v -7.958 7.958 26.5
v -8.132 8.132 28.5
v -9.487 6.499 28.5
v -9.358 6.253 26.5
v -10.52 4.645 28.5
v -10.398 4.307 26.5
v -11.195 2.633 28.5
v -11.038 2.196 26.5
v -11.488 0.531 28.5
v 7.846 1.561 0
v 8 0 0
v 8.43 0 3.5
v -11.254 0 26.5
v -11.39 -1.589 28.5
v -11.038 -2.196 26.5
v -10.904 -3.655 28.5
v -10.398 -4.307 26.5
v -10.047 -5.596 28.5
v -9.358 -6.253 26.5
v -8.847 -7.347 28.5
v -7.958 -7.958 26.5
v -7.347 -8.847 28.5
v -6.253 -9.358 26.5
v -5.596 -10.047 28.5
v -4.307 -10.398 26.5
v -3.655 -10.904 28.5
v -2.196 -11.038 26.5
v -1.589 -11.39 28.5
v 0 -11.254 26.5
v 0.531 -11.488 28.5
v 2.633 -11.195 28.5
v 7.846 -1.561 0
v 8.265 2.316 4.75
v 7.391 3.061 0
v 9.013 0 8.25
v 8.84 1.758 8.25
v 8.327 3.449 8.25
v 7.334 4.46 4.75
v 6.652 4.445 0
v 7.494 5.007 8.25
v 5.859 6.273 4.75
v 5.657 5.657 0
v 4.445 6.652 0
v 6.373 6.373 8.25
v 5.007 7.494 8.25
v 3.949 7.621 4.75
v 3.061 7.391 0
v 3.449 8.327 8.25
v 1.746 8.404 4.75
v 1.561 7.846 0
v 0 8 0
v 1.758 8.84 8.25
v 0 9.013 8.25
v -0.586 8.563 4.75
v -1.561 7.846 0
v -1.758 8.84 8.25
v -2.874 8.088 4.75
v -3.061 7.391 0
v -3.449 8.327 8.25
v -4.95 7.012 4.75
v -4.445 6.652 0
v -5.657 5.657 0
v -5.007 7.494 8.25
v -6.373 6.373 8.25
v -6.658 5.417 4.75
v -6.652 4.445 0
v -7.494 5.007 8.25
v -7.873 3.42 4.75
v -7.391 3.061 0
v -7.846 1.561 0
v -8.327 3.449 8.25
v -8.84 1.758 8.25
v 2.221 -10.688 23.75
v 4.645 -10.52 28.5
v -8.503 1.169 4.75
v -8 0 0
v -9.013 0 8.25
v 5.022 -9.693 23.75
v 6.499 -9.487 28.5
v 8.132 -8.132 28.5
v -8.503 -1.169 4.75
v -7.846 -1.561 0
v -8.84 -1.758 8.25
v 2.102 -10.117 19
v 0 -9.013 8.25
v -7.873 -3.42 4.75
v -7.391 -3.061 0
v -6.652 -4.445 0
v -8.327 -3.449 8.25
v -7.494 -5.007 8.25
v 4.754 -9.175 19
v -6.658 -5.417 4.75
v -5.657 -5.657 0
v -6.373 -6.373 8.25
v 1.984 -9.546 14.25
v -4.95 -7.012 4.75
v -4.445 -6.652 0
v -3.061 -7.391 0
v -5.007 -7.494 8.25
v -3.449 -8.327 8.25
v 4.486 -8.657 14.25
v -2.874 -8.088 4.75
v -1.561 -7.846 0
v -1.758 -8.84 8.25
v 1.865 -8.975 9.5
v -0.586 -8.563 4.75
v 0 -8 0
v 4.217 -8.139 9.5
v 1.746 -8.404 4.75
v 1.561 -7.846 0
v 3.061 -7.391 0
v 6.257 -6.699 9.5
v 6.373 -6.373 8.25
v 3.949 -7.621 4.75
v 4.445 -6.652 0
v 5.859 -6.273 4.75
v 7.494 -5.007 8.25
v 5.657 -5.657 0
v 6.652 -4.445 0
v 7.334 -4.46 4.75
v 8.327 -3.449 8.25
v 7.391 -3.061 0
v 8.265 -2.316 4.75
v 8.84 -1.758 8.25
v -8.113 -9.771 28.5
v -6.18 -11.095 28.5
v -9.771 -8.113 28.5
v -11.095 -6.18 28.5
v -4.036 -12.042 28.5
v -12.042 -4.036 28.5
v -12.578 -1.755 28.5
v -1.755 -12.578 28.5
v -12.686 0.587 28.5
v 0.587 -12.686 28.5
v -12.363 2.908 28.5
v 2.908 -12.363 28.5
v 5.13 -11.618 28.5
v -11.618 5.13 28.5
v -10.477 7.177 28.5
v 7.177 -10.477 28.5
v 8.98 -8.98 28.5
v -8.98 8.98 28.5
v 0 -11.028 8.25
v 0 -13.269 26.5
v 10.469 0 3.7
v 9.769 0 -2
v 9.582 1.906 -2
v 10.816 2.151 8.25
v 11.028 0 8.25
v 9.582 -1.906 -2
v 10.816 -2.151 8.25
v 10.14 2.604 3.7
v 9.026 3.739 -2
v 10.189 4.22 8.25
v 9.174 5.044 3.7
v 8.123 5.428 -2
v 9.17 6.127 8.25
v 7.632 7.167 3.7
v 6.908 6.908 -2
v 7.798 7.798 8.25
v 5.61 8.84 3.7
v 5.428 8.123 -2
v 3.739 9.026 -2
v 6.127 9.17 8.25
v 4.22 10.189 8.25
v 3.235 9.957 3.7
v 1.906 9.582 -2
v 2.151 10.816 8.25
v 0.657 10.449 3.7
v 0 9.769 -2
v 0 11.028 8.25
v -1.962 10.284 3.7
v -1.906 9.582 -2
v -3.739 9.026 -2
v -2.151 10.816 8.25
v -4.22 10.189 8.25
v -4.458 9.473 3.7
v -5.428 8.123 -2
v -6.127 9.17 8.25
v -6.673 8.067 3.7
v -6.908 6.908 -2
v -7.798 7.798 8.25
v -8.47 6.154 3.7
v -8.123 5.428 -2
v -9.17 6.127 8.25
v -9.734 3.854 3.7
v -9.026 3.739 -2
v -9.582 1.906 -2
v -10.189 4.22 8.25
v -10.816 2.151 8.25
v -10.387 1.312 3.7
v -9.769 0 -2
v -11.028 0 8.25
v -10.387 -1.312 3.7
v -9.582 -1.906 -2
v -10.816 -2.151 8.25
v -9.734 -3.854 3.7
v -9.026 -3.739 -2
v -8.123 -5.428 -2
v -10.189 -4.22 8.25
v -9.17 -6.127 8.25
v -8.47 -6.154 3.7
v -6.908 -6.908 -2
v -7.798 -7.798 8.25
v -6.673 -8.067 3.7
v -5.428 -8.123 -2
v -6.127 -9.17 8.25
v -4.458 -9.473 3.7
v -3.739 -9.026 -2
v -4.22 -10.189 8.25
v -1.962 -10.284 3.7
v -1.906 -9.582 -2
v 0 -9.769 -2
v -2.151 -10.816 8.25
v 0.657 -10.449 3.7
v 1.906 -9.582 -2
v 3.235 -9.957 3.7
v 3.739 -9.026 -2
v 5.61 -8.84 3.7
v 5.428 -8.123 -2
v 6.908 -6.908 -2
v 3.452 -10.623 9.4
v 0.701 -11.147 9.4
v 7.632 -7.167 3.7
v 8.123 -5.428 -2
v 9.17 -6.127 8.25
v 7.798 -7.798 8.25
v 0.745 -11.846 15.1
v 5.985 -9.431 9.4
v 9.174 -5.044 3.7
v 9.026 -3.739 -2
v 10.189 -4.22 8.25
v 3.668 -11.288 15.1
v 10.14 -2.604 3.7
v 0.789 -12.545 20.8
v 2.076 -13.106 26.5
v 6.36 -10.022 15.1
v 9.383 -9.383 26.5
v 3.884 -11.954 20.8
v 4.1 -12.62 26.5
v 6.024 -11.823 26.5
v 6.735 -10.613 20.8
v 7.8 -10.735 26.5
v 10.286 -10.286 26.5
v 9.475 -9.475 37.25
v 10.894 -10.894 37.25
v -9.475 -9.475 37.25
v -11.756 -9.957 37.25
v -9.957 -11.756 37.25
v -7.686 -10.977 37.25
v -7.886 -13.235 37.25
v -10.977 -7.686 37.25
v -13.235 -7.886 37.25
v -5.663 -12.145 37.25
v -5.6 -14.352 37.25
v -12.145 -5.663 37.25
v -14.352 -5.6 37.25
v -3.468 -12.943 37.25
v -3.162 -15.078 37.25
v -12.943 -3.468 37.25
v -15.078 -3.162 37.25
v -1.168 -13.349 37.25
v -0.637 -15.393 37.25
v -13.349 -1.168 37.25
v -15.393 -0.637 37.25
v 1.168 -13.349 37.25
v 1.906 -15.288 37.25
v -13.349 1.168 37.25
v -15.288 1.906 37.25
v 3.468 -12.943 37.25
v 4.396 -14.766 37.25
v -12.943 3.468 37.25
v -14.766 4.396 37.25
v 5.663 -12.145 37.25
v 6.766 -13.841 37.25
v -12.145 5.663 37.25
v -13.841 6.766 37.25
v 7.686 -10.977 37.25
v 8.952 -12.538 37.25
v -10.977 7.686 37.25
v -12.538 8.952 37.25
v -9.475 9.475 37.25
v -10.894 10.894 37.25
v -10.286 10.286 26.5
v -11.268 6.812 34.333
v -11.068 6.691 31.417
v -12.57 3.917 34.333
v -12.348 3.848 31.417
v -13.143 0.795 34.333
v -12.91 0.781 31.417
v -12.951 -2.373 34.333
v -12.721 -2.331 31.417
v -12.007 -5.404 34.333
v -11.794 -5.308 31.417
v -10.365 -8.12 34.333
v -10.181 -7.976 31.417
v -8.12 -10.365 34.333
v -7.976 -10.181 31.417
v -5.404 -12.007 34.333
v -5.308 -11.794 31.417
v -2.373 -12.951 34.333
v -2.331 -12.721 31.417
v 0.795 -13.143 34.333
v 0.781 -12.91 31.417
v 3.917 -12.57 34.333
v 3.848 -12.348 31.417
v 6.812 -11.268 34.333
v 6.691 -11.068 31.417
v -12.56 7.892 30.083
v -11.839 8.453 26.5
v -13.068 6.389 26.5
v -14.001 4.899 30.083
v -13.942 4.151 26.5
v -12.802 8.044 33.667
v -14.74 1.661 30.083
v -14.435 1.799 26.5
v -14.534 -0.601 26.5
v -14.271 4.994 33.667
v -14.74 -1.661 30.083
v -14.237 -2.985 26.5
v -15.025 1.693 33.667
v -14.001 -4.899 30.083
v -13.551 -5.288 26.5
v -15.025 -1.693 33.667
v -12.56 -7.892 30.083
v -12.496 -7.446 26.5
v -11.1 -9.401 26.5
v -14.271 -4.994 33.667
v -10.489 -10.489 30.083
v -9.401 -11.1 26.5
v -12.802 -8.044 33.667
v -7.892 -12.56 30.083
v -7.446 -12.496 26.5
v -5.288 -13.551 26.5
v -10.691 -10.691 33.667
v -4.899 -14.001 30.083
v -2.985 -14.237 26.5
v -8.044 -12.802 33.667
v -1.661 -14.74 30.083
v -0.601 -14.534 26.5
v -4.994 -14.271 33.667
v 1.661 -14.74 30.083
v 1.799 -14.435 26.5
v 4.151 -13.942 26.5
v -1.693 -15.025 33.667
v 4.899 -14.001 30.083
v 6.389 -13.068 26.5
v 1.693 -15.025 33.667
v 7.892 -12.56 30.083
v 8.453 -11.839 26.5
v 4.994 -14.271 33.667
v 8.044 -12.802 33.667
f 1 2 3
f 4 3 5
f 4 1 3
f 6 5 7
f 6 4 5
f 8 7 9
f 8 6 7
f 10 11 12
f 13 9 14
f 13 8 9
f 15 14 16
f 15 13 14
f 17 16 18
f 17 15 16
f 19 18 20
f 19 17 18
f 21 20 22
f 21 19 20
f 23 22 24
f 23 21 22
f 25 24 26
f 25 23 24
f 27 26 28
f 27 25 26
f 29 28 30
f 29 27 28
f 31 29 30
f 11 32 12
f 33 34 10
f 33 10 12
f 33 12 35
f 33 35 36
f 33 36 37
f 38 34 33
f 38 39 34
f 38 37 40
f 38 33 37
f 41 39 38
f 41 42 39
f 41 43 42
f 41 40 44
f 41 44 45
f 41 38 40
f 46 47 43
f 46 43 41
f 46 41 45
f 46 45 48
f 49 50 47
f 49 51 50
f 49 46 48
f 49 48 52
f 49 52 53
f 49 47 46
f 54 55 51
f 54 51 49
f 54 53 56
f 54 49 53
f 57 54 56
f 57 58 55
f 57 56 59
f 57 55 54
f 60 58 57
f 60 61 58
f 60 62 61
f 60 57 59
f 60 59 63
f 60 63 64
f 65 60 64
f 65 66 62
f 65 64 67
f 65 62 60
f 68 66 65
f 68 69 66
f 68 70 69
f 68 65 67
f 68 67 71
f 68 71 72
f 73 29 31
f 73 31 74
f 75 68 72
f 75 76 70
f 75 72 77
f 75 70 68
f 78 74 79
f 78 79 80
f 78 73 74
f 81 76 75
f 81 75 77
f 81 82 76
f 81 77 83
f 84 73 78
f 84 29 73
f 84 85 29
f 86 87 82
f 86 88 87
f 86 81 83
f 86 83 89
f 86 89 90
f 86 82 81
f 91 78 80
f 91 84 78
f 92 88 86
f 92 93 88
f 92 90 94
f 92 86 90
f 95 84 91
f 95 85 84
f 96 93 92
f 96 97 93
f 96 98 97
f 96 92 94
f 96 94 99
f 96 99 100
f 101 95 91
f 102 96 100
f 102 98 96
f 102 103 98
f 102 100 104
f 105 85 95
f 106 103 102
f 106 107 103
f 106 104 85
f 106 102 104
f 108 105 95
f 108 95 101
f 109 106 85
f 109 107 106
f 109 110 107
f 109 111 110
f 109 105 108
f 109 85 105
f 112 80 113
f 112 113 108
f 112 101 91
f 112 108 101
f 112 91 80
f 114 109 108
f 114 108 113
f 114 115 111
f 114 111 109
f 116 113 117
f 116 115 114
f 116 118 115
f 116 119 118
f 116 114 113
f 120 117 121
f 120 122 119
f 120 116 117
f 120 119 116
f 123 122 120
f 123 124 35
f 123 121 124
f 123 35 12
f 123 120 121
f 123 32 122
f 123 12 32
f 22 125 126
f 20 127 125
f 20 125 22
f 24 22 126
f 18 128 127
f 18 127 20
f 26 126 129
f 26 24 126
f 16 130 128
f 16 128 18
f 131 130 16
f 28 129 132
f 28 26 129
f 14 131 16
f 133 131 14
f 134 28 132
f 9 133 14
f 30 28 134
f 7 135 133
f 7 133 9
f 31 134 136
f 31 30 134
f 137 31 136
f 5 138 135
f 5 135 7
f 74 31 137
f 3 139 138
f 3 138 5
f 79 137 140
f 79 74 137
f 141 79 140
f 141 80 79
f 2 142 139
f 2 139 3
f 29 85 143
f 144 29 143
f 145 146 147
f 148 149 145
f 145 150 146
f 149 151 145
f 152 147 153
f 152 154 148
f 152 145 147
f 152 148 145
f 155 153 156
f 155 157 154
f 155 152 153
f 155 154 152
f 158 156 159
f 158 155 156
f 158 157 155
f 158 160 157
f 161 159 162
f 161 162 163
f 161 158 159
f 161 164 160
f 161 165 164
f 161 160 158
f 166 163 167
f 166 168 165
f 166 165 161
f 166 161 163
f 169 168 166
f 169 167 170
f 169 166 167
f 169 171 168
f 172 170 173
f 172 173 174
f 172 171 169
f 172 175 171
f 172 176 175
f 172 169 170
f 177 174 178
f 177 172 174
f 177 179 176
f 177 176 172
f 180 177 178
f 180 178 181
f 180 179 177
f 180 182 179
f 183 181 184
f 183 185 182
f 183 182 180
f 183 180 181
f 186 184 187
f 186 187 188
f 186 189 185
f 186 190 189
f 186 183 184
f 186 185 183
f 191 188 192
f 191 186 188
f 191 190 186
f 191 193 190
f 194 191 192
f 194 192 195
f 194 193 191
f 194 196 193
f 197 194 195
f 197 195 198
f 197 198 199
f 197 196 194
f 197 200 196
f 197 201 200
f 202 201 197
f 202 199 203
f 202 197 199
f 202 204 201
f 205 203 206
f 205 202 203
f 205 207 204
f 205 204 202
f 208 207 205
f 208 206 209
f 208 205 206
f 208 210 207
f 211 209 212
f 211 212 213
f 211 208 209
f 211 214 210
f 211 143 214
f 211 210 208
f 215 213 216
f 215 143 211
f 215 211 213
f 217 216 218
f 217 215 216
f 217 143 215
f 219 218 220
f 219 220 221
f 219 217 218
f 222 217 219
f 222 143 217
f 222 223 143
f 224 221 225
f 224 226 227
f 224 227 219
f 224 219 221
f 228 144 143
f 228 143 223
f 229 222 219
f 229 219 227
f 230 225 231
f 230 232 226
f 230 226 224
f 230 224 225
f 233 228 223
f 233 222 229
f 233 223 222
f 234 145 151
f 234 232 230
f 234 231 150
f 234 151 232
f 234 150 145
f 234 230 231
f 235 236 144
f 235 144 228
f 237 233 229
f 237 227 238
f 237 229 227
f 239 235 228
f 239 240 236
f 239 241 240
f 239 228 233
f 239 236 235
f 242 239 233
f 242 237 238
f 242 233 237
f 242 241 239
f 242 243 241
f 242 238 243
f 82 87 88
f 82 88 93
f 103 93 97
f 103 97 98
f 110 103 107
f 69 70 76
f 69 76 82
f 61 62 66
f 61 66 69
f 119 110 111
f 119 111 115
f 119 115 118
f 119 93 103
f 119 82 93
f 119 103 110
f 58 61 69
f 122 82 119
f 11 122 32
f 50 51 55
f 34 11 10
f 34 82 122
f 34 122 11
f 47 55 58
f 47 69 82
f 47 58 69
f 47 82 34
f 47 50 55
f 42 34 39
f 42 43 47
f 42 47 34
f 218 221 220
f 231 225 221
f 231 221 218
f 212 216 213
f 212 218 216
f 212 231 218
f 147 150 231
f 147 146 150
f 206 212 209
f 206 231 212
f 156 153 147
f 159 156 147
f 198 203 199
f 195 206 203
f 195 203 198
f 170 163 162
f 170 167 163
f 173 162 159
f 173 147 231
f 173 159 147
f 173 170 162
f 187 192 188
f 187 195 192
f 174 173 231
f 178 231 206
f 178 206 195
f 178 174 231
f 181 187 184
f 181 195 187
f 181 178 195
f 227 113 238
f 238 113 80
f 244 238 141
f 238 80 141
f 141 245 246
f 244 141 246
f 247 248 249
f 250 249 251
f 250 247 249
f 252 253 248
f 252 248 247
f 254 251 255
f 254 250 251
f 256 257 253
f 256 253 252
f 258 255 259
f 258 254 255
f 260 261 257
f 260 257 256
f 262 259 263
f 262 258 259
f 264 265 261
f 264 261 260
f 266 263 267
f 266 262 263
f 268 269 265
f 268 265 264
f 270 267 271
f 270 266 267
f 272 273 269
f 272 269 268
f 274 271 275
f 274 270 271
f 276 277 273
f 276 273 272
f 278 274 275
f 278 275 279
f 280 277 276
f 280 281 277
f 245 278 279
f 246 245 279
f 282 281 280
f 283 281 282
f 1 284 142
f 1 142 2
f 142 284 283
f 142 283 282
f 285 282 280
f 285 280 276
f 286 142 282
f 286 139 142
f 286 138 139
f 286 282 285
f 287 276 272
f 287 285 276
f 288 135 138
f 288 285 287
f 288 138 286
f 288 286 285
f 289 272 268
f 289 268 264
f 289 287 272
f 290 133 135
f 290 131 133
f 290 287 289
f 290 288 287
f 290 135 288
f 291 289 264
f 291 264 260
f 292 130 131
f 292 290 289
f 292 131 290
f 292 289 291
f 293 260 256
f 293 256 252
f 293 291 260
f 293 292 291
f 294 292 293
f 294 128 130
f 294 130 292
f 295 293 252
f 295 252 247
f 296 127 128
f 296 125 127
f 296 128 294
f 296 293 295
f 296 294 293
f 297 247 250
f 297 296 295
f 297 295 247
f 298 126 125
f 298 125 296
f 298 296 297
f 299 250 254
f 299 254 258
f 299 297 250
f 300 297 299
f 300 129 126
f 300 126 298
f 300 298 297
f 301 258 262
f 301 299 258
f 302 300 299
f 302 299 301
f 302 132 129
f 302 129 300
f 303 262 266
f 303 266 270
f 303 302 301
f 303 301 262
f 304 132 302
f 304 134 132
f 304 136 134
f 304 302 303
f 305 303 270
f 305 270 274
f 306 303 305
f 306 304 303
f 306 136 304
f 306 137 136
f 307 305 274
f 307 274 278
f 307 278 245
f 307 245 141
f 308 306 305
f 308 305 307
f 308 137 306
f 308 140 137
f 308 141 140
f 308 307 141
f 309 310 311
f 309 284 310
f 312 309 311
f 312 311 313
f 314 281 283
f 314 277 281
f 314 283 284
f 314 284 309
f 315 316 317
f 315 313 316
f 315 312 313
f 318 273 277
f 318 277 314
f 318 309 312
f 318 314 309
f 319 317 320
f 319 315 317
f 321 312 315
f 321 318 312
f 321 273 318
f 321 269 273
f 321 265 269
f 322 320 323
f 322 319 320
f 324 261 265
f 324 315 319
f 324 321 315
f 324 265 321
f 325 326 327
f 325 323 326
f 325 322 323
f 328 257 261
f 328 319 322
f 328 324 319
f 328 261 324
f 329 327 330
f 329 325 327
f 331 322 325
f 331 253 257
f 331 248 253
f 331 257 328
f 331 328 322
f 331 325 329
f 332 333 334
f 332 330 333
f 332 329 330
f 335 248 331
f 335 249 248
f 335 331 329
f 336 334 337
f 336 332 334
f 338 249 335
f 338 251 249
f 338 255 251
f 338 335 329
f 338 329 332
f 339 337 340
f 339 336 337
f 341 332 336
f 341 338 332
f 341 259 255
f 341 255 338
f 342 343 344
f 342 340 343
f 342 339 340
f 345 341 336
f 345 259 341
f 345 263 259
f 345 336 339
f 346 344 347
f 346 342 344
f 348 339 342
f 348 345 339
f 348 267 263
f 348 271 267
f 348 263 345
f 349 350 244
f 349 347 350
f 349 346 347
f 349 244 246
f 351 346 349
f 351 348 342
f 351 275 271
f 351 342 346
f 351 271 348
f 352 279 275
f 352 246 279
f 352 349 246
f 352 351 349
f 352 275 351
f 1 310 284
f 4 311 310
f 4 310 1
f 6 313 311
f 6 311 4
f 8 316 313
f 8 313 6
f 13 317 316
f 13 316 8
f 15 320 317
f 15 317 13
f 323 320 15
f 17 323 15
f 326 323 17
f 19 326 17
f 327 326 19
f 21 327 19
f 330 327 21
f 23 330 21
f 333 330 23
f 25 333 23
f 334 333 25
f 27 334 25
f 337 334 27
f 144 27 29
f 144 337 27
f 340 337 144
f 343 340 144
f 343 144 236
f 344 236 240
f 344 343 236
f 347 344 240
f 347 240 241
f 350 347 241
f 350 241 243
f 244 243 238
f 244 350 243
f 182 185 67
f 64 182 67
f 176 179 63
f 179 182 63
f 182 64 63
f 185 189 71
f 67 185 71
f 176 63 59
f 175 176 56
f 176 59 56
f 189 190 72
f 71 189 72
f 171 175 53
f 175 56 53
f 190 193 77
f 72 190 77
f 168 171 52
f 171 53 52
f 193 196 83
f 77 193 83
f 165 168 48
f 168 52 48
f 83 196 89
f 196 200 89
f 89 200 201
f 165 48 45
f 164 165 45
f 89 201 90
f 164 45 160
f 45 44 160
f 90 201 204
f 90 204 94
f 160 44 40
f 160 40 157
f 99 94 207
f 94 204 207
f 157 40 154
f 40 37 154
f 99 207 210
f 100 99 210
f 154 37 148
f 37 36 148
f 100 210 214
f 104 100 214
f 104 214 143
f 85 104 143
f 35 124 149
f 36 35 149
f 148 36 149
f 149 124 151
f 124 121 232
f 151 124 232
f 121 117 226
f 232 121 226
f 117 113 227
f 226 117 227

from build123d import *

# Parameters (mm, degrees)
F3_DEPTH = 18.25
F5_DEPTH = 29


with BuildPart() as f1:
    # F0 (on Front) → F1 (revolve)
    with BuildSketch(Plane.XZ):
        Polygon((8, 0), (0, 0), (0, -2), (9.769411, -2), (13.269411, 26.5), (14.54639, 26.5), (15.40639, 37.25), (13.4, 37.25), (12.7, 28.5), (11.5, 28.5), align=None)
    revolve(axis=Axis((0, 0, 14.25), (0, 0, 1)))

    # F2 (on face) → F3 (cut)
    with BuildSketch(Plane(origin=(0, 0, 26.5), x_dir=(1, 0, 0), z_dir=(0, 0, -1))):
        Polygon((-21.099057, 0), (-20.108491, 0), (0, 0), (0, 20.207549), (-21.099057, 20.207549), align=None)
        Polygon((0, 0), (-20.108491, 0), (-20.108491, -19.117925), (20.306604, -19.117925), (20.306604, 0), align=None)
    extrude(amount=F3_DEPTH, mode=Mode.SUBTRACT)

    # F4 (on face) → F5 (cut)
    with BuildSketch(Plane.XY.offset(37.25)):
        Polygon((25.364828, 31.607275), (-31.607275, 31.607275), (25.364828, -25.364828), align=None)
    extrude(amount=-F5_DEPTH, mode=Mode.SUBTRACT)


solid = f1.part
